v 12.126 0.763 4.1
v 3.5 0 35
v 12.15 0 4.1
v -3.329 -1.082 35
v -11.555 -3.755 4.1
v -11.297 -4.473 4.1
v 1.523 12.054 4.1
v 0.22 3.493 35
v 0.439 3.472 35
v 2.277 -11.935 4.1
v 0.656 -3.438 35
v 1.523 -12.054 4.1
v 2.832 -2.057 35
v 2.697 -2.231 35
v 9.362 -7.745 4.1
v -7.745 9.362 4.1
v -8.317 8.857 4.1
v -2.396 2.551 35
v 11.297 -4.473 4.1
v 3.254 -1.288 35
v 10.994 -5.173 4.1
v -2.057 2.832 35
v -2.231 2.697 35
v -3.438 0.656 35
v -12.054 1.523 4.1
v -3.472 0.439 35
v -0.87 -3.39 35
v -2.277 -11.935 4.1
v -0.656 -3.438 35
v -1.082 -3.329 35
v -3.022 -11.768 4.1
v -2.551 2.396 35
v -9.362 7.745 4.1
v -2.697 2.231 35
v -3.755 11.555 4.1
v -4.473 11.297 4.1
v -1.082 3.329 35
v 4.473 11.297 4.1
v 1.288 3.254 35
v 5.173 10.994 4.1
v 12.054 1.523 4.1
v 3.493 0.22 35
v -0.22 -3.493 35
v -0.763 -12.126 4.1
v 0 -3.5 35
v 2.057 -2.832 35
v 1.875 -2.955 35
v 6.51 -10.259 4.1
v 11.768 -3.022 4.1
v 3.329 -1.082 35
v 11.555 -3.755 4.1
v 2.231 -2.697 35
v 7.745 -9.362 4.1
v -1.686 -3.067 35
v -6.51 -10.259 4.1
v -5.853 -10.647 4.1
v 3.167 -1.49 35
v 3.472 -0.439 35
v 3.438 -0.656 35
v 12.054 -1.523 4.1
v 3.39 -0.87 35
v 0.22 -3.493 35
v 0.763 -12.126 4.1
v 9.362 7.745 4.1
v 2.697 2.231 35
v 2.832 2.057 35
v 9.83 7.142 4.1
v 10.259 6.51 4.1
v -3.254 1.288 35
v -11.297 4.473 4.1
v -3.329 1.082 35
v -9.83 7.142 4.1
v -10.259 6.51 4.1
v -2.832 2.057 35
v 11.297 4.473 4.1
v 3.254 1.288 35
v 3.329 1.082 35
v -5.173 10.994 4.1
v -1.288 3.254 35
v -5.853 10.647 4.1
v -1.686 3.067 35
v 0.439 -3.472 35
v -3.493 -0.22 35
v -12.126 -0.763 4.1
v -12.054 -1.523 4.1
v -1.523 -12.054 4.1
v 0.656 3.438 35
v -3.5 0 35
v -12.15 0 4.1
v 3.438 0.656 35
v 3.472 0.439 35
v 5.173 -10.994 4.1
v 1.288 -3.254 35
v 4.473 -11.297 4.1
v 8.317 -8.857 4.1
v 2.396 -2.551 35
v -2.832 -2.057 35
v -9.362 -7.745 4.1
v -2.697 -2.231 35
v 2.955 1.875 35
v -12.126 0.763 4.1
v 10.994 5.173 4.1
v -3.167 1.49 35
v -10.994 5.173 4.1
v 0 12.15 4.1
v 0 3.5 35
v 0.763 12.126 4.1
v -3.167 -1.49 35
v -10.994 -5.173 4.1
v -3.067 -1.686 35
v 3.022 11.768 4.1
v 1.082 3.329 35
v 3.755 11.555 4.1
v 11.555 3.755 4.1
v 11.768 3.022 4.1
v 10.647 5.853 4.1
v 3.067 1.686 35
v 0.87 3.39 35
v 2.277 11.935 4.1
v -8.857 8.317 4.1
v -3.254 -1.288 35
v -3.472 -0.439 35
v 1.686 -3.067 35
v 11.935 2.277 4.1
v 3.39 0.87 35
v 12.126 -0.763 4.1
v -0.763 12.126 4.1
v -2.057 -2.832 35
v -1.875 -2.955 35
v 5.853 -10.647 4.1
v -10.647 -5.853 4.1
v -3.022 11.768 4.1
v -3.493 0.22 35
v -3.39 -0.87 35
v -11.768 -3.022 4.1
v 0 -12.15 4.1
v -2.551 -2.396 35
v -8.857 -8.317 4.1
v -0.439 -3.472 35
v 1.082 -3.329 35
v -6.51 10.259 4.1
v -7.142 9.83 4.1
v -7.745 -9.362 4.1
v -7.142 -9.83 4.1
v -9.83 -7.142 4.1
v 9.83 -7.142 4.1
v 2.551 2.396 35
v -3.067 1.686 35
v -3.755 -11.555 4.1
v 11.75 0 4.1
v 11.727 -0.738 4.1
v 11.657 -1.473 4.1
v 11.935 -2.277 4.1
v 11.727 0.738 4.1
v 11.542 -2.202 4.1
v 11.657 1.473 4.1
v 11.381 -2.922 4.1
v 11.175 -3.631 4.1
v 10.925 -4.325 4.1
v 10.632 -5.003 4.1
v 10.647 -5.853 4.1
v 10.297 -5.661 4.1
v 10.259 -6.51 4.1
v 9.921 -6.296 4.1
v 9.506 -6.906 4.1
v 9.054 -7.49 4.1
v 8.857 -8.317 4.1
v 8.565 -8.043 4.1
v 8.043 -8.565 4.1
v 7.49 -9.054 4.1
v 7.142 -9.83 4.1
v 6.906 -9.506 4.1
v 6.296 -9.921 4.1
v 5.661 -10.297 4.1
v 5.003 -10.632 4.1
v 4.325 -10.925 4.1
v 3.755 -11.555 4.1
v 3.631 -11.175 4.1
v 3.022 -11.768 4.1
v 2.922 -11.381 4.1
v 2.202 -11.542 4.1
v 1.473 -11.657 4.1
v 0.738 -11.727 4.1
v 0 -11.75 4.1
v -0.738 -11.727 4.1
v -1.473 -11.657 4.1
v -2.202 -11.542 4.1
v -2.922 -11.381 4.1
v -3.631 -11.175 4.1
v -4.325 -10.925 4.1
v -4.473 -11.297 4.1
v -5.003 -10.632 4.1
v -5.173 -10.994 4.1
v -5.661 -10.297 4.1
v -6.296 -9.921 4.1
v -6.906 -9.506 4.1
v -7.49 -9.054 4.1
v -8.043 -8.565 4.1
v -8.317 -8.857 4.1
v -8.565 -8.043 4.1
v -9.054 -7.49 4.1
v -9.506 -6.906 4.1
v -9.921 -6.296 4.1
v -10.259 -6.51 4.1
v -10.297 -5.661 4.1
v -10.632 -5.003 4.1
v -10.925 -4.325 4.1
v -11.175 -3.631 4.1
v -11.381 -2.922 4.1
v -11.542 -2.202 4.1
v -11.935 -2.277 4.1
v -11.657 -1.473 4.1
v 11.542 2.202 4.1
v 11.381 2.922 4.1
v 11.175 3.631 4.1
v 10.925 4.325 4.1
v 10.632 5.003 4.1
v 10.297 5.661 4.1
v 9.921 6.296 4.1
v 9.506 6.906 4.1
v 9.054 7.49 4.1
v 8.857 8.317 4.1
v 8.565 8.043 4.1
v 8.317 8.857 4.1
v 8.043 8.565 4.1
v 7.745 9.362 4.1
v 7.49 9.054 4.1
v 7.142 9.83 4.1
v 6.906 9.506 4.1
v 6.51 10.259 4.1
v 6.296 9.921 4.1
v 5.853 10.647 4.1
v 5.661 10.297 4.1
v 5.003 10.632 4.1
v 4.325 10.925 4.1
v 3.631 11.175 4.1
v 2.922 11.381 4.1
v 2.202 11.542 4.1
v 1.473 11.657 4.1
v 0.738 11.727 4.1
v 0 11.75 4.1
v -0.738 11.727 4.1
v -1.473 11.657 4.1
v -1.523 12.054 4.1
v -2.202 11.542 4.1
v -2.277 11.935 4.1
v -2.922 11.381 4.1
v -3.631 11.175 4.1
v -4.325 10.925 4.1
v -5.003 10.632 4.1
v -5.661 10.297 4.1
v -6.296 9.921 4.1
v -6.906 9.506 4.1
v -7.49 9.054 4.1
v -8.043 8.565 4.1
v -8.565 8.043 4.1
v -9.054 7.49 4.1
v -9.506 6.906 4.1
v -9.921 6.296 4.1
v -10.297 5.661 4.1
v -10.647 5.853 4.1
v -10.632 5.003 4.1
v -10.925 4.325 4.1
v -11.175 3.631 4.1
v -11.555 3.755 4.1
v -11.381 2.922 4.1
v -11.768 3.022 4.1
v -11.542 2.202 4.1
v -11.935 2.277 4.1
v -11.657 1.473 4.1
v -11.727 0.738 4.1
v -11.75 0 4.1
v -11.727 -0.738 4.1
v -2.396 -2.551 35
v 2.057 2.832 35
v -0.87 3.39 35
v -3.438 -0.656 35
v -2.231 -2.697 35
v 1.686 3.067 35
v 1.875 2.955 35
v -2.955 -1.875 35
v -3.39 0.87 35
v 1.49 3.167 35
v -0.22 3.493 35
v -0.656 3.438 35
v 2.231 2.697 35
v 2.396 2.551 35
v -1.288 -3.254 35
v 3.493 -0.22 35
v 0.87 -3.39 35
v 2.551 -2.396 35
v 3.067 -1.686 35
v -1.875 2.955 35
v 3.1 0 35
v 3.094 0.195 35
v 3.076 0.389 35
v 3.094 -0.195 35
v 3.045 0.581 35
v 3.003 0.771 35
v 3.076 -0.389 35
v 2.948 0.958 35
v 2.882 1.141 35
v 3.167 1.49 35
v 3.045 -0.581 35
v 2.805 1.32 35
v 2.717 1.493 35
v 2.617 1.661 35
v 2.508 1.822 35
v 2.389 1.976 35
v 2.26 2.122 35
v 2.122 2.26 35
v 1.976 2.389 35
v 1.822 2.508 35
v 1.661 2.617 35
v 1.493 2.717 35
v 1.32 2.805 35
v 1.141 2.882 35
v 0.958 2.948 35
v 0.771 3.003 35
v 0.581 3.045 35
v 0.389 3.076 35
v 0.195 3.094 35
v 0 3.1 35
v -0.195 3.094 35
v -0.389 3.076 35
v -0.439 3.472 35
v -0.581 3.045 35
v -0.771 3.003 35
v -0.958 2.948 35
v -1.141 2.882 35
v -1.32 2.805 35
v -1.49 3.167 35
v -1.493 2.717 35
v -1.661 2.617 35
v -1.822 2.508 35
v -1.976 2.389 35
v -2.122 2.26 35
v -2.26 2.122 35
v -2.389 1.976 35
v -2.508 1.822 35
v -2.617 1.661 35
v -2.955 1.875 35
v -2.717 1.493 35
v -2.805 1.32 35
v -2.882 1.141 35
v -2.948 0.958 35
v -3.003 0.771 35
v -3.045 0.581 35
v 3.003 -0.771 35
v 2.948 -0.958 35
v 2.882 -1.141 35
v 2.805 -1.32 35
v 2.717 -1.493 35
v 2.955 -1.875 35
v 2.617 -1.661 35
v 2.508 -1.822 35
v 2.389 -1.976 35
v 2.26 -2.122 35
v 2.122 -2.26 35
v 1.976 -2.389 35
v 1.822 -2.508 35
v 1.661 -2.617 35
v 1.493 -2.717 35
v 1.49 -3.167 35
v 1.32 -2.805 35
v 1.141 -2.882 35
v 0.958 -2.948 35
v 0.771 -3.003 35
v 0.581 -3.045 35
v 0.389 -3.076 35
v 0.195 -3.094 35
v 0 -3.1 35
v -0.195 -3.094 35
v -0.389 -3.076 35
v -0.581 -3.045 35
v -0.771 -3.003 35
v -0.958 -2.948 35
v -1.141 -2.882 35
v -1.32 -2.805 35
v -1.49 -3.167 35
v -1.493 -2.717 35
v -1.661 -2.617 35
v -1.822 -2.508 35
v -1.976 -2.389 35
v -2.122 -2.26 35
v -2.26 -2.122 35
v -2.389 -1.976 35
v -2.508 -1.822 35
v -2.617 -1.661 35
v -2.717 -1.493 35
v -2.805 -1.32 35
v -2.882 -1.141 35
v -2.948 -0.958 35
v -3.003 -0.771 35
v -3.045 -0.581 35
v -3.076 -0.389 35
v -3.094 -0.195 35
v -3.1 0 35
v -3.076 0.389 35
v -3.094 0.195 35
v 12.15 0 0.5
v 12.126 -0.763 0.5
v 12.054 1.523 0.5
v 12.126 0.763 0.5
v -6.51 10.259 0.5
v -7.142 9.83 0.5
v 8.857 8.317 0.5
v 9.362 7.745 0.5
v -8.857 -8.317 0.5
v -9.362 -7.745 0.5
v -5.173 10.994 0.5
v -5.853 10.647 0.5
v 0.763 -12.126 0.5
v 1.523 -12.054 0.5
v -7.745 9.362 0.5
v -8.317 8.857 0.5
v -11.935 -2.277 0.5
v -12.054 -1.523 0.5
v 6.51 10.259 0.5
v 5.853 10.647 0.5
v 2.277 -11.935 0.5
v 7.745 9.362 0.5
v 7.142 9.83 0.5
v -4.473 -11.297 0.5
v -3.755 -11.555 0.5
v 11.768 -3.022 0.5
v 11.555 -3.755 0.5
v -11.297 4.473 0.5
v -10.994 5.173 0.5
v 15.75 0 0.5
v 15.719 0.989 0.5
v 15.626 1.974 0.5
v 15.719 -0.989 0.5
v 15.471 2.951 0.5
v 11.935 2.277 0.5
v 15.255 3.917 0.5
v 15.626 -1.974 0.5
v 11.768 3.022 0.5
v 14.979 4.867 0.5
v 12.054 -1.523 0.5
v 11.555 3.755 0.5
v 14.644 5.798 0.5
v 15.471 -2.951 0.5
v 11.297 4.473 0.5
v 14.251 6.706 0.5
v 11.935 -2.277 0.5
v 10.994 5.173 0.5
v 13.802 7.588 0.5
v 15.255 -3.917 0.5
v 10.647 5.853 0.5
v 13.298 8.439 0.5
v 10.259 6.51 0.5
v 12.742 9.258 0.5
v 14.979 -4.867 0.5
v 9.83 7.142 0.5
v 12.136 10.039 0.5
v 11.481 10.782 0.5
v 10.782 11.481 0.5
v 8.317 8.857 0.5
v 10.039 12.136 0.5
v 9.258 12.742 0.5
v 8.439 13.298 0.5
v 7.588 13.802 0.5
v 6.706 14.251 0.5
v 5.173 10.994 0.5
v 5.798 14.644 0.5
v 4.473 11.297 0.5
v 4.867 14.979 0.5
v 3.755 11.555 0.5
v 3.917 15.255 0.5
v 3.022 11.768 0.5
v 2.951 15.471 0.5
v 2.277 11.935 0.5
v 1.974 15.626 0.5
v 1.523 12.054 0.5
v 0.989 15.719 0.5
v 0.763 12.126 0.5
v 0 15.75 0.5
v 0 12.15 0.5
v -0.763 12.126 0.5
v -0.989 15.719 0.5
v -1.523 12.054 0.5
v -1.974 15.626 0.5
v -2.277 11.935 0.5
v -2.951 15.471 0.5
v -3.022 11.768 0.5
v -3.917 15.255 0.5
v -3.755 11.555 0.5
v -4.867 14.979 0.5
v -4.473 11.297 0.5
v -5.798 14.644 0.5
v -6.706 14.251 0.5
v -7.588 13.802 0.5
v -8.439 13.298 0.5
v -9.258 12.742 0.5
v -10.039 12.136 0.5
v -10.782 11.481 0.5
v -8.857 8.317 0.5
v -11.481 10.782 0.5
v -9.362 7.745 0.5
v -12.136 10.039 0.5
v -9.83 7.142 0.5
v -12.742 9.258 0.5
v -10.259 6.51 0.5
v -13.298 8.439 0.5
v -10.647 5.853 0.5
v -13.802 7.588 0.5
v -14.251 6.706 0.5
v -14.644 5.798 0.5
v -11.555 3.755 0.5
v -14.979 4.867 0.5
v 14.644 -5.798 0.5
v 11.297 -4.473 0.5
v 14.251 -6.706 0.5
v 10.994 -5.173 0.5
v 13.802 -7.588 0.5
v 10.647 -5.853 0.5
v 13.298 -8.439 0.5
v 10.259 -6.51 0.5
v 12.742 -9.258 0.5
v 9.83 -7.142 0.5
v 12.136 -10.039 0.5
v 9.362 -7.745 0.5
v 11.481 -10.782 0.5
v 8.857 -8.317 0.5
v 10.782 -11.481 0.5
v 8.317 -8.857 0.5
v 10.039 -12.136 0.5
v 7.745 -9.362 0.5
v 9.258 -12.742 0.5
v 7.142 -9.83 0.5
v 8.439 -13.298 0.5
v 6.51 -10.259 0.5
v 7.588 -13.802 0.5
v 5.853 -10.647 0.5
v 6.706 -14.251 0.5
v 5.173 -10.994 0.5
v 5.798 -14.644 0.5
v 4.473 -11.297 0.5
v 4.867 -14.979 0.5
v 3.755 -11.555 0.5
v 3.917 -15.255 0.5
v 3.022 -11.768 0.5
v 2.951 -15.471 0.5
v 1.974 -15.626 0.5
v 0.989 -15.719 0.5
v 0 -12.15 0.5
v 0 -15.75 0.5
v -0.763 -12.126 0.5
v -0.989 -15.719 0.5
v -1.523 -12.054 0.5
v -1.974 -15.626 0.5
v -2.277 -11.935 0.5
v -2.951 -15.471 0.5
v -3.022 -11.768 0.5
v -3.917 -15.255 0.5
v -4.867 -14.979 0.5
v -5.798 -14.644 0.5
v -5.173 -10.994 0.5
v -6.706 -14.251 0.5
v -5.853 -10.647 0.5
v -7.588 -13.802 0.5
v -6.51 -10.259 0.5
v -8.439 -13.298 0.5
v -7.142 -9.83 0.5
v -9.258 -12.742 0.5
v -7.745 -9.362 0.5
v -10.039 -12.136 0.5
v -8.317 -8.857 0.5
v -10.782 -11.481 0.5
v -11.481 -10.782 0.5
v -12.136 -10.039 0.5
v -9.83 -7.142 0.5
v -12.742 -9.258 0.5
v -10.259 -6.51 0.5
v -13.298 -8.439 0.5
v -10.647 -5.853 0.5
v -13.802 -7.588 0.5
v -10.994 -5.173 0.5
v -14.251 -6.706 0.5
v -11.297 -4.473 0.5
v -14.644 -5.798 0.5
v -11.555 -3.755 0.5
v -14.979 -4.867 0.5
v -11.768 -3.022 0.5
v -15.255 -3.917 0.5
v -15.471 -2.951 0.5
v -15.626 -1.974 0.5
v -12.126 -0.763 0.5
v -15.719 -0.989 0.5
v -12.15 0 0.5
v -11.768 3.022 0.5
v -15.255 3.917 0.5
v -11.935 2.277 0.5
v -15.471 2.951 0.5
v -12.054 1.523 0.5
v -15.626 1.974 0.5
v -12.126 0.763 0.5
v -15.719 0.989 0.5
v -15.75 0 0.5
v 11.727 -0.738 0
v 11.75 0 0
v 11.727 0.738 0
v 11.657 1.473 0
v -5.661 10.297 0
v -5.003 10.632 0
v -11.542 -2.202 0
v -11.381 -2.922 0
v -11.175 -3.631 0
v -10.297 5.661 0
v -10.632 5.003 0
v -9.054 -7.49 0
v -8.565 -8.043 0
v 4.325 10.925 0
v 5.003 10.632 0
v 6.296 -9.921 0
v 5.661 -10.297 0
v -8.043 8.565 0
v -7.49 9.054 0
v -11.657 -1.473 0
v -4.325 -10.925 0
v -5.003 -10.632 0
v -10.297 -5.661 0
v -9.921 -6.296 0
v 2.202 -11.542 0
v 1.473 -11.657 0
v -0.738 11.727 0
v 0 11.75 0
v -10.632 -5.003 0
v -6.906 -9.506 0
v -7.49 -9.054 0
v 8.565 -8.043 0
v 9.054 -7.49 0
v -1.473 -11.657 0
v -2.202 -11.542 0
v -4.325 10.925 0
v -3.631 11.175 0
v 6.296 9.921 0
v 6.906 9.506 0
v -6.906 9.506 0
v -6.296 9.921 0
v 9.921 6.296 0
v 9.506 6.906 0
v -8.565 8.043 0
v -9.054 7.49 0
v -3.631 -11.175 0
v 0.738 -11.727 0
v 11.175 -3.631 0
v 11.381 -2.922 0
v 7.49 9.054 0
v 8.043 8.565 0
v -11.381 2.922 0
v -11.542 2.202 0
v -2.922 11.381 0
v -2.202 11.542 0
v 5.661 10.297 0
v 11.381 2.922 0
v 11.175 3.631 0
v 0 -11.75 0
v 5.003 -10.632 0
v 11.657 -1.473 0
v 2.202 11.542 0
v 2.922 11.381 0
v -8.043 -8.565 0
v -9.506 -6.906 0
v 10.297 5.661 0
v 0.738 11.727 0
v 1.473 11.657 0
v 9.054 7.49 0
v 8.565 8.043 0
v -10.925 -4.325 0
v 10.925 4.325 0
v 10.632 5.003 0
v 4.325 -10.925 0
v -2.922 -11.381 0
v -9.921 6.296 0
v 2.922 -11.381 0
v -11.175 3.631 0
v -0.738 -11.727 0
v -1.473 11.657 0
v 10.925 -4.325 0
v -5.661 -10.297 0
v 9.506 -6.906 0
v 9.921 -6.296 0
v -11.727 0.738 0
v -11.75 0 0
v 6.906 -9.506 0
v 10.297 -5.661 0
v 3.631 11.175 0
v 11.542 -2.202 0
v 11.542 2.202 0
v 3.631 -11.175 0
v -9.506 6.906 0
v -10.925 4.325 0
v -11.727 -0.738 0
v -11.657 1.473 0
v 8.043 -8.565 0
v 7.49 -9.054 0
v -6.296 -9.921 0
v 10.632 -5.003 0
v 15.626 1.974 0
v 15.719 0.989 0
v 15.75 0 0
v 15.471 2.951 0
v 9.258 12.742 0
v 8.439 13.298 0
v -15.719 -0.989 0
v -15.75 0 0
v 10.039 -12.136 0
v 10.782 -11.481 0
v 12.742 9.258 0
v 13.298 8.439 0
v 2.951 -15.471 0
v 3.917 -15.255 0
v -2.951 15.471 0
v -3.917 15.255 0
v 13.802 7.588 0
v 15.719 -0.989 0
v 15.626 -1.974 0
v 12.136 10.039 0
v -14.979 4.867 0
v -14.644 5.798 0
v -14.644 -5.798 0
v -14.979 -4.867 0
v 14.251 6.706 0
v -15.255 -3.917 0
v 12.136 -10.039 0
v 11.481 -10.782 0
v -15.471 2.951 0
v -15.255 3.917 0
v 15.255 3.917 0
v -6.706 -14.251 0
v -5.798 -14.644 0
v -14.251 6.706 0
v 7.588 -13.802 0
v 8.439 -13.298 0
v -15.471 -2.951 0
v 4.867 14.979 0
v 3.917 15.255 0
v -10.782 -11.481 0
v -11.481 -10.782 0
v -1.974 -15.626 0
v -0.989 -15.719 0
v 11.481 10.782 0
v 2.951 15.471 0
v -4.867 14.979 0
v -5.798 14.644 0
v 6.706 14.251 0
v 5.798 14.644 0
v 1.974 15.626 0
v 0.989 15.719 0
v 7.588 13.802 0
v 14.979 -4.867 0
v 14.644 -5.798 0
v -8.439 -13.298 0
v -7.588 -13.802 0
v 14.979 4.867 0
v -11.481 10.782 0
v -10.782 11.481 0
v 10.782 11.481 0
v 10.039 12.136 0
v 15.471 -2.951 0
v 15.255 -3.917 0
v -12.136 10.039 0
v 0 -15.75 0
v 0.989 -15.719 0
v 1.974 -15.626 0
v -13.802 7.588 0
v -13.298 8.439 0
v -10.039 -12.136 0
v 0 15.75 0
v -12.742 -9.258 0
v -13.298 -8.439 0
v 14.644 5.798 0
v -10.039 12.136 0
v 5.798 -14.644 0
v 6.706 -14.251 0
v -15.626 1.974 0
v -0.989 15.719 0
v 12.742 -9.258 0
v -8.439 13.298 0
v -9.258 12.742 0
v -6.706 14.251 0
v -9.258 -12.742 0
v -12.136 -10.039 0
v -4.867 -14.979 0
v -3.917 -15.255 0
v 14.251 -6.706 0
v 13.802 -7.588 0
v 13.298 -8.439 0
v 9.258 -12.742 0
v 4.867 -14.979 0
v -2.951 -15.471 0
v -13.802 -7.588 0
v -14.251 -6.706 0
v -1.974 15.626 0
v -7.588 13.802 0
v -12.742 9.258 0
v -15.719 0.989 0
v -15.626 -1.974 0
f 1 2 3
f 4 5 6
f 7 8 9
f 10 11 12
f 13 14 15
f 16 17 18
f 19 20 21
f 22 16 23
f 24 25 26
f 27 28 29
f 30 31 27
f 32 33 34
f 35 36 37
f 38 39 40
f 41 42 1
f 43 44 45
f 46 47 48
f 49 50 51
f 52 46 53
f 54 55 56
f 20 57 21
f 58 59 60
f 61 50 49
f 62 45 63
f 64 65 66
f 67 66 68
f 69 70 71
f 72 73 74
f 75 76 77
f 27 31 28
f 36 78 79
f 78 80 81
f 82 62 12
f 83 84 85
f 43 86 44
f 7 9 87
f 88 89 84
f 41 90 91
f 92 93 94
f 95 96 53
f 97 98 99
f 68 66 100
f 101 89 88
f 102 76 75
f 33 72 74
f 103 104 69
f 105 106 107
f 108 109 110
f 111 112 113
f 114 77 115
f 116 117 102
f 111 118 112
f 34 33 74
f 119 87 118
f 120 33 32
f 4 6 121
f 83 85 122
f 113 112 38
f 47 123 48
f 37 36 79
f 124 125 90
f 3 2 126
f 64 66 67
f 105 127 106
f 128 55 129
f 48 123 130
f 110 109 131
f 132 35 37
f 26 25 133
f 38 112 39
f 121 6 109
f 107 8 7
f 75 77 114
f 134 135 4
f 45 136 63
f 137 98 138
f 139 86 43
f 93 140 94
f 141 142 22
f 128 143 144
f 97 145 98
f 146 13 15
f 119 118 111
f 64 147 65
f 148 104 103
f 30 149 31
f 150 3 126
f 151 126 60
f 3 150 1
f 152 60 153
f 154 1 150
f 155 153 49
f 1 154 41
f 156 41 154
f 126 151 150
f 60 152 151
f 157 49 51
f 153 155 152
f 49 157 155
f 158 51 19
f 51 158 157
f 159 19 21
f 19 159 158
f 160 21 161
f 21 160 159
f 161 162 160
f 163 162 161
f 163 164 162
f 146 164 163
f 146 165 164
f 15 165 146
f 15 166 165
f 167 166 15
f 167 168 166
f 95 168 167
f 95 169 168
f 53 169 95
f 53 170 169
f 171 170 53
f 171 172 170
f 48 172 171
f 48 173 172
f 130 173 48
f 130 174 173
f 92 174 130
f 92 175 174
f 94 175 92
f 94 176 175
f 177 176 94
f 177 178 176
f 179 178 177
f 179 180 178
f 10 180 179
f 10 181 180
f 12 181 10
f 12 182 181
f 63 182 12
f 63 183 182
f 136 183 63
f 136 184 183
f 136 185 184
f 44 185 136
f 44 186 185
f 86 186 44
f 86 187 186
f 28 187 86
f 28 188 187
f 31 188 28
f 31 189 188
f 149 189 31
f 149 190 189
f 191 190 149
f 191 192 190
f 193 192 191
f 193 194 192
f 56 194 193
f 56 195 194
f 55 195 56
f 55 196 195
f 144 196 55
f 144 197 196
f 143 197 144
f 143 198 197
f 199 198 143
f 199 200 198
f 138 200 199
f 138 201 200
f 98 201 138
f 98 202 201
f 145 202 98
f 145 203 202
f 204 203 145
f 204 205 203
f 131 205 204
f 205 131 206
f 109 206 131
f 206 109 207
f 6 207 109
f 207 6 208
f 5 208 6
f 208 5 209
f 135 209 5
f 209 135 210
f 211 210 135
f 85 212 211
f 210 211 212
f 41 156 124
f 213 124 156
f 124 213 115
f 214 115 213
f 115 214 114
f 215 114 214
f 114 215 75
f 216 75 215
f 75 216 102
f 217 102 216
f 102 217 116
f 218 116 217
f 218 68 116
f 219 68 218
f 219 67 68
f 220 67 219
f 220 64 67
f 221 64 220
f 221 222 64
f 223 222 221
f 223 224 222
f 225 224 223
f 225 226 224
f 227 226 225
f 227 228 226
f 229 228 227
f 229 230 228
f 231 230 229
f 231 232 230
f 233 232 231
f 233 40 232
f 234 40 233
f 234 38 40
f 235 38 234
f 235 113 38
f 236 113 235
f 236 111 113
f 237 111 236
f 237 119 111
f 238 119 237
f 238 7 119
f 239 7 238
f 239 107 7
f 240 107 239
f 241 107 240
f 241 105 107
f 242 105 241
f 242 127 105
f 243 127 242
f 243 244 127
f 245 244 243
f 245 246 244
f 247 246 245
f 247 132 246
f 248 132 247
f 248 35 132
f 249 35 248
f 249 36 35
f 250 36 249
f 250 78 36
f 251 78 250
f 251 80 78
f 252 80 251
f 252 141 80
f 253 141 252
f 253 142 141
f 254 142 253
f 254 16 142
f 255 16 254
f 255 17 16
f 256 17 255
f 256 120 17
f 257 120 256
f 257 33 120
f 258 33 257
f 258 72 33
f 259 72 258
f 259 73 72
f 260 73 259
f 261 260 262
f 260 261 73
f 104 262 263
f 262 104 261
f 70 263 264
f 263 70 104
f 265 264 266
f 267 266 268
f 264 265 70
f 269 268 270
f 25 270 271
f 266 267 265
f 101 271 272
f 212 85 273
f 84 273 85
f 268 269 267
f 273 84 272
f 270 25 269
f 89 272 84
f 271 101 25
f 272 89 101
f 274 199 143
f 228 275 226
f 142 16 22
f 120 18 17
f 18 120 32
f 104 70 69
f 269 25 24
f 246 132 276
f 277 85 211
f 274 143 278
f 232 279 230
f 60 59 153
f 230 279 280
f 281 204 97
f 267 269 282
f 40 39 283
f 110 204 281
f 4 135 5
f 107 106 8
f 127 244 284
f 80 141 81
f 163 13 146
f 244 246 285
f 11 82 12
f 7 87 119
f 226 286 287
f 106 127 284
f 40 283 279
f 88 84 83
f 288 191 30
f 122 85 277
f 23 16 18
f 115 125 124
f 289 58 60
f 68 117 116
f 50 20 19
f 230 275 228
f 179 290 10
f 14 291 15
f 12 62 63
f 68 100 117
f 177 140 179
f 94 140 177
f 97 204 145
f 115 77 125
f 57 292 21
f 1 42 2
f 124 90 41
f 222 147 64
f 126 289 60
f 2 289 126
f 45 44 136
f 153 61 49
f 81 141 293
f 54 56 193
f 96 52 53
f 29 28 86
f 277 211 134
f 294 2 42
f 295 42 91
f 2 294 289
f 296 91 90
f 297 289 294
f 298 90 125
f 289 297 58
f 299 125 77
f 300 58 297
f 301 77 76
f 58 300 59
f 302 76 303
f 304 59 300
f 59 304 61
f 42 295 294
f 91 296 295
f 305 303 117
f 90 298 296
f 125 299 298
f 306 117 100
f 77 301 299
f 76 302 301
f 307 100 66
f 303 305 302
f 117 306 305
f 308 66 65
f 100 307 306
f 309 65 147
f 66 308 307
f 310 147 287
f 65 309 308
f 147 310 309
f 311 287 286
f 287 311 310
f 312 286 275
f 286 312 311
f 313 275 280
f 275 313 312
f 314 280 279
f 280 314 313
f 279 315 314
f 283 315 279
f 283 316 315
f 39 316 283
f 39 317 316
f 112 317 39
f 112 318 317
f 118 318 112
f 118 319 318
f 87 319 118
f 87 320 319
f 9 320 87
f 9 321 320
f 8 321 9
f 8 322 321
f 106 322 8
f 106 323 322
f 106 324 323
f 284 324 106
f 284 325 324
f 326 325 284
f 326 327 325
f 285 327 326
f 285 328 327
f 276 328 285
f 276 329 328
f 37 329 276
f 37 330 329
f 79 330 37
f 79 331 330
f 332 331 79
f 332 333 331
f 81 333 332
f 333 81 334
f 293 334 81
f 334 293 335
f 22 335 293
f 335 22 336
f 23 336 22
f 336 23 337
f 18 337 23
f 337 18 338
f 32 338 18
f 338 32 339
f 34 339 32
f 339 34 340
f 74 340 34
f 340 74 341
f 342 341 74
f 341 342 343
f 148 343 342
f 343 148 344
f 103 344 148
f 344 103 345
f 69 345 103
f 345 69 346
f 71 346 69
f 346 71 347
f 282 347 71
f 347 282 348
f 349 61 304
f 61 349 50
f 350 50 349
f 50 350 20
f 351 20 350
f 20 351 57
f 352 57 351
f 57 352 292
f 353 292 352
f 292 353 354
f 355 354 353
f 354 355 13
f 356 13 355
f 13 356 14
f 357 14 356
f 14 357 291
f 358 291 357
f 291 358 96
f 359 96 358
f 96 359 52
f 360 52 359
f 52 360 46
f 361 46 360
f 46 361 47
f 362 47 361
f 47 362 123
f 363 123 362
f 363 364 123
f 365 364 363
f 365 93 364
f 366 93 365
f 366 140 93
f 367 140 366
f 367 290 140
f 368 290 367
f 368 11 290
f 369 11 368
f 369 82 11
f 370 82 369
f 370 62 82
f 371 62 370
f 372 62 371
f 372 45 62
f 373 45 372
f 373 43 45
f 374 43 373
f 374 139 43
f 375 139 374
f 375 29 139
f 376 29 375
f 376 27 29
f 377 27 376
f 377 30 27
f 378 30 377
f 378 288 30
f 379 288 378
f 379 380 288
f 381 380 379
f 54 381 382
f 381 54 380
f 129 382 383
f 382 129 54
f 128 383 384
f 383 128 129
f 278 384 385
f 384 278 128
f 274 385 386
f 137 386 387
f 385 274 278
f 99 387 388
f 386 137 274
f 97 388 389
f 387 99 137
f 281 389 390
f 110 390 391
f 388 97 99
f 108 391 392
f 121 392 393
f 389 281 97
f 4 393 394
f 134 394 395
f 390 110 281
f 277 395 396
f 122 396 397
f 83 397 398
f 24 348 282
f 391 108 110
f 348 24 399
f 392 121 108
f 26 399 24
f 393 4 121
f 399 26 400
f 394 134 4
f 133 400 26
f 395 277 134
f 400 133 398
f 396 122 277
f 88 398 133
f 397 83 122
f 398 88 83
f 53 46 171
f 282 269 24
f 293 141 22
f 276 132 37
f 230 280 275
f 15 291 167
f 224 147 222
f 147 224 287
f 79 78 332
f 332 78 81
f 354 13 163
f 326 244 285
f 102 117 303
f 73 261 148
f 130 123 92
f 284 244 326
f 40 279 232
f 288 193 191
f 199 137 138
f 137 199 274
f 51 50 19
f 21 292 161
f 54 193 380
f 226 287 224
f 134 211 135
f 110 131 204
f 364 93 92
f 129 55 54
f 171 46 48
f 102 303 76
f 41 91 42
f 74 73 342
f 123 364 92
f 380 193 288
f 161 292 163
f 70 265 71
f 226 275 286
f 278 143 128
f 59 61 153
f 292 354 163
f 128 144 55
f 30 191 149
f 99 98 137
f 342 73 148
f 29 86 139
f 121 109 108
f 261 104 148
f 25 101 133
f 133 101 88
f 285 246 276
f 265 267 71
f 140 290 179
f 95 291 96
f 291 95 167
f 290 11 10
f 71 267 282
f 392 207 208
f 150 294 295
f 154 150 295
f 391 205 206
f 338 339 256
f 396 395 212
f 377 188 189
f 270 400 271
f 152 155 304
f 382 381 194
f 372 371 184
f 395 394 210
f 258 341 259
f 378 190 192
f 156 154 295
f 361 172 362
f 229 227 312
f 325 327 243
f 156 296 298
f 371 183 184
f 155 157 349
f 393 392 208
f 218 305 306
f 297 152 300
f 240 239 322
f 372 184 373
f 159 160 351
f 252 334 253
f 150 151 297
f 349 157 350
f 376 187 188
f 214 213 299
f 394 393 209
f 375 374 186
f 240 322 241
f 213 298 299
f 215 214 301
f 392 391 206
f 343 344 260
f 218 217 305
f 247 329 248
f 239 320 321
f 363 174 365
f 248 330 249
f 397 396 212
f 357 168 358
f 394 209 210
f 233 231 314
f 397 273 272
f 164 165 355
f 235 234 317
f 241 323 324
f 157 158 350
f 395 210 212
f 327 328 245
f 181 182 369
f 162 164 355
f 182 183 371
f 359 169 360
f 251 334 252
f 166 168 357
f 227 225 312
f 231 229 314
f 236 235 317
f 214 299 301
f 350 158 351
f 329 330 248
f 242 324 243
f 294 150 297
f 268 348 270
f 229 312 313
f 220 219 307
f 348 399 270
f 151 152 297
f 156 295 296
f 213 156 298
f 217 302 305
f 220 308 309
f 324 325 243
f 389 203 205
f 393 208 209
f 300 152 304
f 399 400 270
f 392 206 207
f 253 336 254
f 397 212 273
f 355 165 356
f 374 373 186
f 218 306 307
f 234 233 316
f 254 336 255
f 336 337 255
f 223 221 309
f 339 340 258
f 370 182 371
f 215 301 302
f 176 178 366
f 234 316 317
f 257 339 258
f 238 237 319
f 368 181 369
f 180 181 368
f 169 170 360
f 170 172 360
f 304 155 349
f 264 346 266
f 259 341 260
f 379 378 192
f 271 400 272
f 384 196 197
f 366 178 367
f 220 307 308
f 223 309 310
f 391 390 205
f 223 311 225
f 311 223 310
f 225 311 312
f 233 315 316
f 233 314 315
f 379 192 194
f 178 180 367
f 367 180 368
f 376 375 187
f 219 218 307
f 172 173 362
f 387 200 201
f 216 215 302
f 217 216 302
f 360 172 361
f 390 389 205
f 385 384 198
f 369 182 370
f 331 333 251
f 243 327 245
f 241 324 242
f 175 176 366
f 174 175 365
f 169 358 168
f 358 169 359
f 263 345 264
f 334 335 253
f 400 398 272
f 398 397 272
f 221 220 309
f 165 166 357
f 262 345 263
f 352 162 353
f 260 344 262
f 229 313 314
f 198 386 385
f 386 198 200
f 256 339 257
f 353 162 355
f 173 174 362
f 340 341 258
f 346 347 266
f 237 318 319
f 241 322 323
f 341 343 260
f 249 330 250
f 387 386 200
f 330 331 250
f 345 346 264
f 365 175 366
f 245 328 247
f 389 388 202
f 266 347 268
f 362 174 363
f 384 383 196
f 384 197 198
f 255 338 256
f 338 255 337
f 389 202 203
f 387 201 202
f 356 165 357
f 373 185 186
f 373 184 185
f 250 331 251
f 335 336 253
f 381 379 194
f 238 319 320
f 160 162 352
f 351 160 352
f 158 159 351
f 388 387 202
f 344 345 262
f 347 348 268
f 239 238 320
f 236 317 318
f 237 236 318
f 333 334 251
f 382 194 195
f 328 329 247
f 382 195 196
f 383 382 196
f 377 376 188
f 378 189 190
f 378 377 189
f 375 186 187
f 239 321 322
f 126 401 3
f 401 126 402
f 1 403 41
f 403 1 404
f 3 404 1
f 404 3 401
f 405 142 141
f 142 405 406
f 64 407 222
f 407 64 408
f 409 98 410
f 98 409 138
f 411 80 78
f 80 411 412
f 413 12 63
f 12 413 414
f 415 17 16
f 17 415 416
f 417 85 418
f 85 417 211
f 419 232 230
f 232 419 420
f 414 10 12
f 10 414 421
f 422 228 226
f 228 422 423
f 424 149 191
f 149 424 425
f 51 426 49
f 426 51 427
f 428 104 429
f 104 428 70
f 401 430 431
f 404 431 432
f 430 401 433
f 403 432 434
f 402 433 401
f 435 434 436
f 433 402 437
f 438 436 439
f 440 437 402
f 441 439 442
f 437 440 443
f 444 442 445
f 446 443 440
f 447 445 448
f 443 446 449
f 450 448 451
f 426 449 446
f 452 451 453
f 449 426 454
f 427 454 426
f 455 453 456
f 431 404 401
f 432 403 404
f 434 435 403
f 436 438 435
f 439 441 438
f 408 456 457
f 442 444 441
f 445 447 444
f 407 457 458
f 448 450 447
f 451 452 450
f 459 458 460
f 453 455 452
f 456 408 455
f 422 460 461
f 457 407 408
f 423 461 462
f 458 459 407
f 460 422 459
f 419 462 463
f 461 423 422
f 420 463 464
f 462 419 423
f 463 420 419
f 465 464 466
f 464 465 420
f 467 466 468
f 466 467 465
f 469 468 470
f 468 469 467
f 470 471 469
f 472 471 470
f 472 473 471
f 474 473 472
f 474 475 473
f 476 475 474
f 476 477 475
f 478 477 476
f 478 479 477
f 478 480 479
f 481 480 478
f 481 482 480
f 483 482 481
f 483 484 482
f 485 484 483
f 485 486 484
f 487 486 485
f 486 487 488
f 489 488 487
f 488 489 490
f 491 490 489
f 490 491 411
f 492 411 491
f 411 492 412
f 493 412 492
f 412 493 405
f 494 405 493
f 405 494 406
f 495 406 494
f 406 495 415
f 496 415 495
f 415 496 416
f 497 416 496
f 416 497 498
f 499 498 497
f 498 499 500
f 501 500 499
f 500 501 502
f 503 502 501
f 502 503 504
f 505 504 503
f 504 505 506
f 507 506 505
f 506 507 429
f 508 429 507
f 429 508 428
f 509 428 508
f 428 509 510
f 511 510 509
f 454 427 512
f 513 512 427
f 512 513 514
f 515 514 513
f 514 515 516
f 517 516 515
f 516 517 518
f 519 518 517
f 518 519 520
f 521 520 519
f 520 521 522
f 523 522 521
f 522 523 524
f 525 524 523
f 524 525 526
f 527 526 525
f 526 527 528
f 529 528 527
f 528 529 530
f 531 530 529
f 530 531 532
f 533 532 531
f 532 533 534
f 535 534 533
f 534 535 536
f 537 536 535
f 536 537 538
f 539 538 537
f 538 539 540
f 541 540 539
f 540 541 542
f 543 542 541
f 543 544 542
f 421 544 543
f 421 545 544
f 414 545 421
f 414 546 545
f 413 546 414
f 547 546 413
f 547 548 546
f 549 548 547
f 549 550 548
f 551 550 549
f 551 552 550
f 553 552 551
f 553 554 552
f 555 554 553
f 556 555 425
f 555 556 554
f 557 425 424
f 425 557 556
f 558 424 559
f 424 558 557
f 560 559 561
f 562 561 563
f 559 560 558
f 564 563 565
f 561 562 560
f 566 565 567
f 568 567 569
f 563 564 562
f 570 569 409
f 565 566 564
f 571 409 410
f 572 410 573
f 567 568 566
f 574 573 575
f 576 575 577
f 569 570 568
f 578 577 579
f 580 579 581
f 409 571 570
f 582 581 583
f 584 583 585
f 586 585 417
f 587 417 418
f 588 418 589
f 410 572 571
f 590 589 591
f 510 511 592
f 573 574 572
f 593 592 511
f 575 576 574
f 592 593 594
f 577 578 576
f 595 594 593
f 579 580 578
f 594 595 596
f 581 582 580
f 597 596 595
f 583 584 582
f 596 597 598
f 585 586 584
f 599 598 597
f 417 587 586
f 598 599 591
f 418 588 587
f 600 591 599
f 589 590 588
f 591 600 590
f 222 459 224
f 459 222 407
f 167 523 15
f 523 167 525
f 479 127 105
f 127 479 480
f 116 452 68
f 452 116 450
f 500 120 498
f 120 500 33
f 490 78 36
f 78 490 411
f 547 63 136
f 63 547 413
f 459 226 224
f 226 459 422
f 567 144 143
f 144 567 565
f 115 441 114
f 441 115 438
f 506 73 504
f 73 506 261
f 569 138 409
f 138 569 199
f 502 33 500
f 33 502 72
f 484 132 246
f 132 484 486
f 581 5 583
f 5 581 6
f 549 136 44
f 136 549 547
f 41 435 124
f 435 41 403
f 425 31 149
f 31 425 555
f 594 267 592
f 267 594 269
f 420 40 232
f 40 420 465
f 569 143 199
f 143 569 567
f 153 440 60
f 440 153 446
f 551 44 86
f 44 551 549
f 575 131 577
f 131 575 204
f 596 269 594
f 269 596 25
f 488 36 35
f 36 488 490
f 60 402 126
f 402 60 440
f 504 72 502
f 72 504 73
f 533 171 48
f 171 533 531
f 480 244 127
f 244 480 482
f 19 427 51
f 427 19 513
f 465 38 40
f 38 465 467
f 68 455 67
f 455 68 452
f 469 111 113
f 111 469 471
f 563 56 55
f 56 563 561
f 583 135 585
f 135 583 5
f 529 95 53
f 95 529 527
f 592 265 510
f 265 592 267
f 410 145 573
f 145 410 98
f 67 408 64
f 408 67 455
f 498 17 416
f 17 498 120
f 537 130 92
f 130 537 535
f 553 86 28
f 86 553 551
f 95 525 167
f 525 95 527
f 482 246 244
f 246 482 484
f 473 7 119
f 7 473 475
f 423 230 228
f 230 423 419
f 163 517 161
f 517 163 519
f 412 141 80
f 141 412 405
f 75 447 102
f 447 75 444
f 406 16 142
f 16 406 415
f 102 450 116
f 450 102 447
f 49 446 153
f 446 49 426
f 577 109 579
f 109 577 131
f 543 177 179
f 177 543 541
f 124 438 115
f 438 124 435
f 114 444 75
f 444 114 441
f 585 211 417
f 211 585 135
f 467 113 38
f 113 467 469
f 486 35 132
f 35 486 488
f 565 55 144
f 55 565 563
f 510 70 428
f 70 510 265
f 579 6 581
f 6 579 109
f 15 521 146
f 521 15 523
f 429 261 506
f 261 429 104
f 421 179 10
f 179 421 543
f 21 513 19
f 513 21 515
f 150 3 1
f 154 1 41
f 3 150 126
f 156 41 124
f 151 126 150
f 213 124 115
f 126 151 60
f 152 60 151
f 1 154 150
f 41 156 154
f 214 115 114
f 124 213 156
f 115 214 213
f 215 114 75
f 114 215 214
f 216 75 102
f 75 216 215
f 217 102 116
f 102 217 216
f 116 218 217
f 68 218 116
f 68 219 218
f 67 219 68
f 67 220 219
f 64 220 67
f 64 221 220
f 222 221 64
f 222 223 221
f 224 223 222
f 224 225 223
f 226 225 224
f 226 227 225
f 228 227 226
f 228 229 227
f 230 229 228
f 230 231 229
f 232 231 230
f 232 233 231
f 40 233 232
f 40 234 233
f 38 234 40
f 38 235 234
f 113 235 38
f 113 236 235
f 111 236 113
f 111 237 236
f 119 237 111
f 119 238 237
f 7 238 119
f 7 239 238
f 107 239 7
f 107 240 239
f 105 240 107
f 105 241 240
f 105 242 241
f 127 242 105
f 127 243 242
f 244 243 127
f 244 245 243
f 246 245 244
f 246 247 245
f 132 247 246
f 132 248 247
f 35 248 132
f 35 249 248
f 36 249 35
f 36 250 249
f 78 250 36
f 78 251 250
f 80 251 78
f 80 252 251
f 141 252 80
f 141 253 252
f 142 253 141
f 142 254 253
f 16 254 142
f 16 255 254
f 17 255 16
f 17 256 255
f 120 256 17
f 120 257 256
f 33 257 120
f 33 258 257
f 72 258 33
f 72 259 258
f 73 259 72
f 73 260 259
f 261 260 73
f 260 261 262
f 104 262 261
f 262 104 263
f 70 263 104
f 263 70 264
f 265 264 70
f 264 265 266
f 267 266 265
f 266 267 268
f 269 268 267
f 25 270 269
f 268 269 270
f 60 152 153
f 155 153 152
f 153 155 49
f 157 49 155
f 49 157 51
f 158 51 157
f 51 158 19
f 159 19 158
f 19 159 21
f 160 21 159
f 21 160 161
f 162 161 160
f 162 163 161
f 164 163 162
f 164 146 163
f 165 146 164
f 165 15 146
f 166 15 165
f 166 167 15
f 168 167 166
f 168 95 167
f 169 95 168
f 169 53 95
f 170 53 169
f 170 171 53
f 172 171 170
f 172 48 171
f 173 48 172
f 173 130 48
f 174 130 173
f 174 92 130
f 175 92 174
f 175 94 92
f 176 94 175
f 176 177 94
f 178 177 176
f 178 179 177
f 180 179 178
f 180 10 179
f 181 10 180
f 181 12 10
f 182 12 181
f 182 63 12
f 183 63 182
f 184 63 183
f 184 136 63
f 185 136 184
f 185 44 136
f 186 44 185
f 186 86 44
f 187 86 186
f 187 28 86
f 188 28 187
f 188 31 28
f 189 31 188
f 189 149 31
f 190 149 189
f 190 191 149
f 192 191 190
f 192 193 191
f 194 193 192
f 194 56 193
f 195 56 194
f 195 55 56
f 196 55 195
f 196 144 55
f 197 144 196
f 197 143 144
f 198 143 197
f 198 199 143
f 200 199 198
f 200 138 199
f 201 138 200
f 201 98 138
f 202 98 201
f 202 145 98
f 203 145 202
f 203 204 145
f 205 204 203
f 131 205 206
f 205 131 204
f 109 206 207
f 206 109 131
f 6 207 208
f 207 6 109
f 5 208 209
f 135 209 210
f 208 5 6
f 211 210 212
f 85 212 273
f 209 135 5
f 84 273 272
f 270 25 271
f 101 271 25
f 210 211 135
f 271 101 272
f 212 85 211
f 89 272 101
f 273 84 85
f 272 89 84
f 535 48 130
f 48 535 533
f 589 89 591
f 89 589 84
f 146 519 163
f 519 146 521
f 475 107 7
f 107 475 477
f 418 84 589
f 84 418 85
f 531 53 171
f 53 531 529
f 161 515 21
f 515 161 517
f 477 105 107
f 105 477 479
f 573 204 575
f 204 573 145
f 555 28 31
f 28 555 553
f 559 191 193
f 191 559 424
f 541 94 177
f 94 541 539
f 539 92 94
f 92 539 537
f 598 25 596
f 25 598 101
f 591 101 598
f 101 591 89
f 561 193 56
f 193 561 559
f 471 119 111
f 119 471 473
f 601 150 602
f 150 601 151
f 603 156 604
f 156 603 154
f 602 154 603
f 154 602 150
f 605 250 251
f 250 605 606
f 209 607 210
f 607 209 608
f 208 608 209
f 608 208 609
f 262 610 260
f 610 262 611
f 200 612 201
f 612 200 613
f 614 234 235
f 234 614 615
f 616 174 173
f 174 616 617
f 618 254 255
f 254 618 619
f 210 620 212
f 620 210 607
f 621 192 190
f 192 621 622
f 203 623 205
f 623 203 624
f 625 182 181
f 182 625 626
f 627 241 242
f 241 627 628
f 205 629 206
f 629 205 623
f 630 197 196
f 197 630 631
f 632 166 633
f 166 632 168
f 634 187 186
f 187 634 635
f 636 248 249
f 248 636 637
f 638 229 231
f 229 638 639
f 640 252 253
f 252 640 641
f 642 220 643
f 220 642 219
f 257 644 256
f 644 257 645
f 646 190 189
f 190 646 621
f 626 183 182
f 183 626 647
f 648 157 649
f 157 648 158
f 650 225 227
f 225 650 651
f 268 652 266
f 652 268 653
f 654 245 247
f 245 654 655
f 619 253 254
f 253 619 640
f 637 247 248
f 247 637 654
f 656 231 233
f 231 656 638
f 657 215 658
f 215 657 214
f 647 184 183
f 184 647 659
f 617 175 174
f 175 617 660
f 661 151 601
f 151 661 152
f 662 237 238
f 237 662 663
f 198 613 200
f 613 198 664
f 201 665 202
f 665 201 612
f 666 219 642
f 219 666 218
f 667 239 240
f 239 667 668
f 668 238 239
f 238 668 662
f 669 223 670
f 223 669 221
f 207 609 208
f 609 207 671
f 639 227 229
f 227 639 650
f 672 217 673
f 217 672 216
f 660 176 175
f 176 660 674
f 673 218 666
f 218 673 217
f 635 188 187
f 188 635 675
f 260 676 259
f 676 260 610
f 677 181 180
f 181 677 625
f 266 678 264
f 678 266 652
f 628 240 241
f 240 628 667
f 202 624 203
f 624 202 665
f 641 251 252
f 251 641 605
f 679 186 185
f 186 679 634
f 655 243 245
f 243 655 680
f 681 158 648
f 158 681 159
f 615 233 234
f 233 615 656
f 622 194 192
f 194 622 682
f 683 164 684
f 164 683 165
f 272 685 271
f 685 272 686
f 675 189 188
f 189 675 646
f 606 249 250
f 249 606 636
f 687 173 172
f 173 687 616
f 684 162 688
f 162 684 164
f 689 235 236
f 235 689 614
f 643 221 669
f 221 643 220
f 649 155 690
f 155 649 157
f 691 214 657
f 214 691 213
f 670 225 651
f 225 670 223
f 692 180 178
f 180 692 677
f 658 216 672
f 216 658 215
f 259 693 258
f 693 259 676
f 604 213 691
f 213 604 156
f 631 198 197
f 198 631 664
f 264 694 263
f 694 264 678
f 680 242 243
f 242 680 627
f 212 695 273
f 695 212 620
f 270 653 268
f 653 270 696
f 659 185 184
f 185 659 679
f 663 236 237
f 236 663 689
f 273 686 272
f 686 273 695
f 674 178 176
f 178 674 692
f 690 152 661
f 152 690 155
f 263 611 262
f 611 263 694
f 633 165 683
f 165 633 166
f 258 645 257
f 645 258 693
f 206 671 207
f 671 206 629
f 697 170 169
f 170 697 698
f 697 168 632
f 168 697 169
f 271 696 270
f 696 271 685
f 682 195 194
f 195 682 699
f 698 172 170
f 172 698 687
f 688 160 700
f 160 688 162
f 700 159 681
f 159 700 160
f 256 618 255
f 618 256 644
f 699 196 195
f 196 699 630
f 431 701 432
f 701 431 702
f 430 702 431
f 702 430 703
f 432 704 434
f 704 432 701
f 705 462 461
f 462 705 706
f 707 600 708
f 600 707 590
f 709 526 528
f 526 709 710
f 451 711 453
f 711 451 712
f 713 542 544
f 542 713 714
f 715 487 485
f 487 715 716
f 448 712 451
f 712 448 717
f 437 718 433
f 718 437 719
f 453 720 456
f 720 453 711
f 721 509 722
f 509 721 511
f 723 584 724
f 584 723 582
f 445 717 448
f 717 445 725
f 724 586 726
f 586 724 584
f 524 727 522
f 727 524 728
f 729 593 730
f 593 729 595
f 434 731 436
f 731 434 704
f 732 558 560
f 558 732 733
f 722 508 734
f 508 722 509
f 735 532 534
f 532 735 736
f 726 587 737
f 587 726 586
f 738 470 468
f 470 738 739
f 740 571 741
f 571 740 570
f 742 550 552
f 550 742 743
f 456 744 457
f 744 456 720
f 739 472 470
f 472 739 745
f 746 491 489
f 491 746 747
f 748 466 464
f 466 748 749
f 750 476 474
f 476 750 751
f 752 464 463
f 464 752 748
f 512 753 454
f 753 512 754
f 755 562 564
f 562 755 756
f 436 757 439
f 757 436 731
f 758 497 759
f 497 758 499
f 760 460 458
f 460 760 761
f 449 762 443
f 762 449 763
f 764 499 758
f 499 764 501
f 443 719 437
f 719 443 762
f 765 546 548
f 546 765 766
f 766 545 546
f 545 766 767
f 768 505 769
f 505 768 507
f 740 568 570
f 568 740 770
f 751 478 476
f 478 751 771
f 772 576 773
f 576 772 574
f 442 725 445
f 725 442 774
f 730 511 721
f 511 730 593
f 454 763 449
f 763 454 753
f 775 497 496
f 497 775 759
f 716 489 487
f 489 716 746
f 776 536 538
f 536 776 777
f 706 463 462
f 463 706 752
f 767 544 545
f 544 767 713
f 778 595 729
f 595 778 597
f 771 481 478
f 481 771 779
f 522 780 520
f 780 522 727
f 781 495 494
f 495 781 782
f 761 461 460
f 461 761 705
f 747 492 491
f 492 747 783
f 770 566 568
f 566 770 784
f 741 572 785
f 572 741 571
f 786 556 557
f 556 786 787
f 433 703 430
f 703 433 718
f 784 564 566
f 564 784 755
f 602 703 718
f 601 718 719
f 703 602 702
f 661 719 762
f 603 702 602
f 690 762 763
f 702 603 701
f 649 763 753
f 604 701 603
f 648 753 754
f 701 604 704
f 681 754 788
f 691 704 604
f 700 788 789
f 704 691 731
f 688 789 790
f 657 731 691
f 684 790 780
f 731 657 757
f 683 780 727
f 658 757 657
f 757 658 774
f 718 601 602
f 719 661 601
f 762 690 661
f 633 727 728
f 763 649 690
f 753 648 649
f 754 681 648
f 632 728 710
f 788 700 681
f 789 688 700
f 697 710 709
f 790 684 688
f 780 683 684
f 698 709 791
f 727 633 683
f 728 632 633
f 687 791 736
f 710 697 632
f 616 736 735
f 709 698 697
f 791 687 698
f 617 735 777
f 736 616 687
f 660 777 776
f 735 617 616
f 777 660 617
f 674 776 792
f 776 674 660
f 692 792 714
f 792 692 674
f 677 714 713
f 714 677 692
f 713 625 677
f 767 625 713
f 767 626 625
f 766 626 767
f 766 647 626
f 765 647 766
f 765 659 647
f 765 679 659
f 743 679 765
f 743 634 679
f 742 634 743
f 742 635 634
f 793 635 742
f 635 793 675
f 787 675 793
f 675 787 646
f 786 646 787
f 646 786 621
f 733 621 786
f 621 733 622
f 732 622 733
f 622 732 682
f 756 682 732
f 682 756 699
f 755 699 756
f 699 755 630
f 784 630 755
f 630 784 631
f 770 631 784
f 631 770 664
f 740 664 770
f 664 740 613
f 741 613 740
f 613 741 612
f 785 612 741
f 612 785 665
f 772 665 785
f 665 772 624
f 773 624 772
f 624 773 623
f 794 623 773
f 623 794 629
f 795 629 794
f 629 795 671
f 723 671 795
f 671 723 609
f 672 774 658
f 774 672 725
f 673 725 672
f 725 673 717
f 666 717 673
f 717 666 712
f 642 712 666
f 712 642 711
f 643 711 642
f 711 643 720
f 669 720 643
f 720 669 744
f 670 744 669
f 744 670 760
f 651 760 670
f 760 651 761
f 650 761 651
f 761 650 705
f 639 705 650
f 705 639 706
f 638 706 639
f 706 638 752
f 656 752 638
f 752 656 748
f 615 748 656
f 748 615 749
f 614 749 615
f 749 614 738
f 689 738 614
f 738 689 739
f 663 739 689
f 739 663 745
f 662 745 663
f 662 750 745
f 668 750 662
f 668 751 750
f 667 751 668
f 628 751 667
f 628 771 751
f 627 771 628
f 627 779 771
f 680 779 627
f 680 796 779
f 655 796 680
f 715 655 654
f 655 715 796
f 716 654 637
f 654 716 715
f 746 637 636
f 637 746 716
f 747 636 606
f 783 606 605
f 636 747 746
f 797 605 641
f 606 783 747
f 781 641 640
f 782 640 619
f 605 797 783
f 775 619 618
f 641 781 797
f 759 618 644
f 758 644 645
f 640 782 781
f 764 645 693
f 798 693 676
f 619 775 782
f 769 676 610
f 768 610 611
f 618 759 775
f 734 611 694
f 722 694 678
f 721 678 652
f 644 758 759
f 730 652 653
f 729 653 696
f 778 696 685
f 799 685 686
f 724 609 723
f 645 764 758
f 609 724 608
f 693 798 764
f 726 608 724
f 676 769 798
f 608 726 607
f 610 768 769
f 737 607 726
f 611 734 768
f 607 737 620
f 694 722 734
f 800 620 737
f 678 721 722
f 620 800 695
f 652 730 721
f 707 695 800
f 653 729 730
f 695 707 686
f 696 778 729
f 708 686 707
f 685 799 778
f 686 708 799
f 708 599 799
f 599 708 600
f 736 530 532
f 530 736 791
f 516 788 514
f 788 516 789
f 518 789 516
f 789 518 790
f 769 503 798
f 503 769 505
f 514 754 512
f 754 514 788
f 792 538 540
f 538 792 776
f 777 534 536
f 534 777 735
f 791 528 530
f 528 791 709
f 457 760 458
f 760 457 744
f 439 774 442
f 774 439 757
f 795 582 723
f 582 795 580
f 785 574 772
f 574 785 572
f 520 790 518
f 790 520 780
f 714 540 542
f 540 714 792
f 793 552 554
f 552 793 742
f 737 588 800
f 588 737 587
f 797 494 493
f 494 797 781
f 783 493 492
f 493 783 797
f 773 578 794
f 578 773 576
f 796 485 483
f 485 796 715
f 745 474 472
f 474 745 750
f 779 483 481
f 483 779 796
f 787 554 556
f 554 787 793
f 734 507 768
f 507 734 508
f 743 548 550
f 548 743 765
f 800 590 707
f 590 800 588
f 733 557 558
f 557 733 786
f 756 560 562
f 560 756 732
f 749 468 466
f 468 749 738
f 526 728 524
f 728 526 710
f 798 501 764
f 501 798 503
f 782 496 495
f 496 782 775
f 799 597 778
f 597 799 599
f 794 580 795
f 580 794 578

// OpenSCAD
/* [Main Dimensions] */

// Size of drill hole
hole_size = 23.5;
// Thickness of wood divider board
board_thickness = 3.6;
// Height
height = 35;
// Top hole size
top_hole = 7;


/* [Hidden] */

rad = hole_size;

$fn = 100;

translate([0,0,board_thickness+.5])
difference()
{
    cylinder(r2=top_hole/2,r1=rad/2+.4,h=height - board_thickness - .5);
    cylinder(r2=top_hole/2-.4,r1=rad/2,h=height - board_thickness - .5);
}

translate([0,0,.5])
difference()
{
    cylinder(r=rad/2+.4,h=board_thickness);
    cylinder(r=rad/2,h=board_thickness);
}



difference()
{
    cylinder(r=rad/2+4,h=.5);
    cylinder(r=rad/2,h=.5);
}
